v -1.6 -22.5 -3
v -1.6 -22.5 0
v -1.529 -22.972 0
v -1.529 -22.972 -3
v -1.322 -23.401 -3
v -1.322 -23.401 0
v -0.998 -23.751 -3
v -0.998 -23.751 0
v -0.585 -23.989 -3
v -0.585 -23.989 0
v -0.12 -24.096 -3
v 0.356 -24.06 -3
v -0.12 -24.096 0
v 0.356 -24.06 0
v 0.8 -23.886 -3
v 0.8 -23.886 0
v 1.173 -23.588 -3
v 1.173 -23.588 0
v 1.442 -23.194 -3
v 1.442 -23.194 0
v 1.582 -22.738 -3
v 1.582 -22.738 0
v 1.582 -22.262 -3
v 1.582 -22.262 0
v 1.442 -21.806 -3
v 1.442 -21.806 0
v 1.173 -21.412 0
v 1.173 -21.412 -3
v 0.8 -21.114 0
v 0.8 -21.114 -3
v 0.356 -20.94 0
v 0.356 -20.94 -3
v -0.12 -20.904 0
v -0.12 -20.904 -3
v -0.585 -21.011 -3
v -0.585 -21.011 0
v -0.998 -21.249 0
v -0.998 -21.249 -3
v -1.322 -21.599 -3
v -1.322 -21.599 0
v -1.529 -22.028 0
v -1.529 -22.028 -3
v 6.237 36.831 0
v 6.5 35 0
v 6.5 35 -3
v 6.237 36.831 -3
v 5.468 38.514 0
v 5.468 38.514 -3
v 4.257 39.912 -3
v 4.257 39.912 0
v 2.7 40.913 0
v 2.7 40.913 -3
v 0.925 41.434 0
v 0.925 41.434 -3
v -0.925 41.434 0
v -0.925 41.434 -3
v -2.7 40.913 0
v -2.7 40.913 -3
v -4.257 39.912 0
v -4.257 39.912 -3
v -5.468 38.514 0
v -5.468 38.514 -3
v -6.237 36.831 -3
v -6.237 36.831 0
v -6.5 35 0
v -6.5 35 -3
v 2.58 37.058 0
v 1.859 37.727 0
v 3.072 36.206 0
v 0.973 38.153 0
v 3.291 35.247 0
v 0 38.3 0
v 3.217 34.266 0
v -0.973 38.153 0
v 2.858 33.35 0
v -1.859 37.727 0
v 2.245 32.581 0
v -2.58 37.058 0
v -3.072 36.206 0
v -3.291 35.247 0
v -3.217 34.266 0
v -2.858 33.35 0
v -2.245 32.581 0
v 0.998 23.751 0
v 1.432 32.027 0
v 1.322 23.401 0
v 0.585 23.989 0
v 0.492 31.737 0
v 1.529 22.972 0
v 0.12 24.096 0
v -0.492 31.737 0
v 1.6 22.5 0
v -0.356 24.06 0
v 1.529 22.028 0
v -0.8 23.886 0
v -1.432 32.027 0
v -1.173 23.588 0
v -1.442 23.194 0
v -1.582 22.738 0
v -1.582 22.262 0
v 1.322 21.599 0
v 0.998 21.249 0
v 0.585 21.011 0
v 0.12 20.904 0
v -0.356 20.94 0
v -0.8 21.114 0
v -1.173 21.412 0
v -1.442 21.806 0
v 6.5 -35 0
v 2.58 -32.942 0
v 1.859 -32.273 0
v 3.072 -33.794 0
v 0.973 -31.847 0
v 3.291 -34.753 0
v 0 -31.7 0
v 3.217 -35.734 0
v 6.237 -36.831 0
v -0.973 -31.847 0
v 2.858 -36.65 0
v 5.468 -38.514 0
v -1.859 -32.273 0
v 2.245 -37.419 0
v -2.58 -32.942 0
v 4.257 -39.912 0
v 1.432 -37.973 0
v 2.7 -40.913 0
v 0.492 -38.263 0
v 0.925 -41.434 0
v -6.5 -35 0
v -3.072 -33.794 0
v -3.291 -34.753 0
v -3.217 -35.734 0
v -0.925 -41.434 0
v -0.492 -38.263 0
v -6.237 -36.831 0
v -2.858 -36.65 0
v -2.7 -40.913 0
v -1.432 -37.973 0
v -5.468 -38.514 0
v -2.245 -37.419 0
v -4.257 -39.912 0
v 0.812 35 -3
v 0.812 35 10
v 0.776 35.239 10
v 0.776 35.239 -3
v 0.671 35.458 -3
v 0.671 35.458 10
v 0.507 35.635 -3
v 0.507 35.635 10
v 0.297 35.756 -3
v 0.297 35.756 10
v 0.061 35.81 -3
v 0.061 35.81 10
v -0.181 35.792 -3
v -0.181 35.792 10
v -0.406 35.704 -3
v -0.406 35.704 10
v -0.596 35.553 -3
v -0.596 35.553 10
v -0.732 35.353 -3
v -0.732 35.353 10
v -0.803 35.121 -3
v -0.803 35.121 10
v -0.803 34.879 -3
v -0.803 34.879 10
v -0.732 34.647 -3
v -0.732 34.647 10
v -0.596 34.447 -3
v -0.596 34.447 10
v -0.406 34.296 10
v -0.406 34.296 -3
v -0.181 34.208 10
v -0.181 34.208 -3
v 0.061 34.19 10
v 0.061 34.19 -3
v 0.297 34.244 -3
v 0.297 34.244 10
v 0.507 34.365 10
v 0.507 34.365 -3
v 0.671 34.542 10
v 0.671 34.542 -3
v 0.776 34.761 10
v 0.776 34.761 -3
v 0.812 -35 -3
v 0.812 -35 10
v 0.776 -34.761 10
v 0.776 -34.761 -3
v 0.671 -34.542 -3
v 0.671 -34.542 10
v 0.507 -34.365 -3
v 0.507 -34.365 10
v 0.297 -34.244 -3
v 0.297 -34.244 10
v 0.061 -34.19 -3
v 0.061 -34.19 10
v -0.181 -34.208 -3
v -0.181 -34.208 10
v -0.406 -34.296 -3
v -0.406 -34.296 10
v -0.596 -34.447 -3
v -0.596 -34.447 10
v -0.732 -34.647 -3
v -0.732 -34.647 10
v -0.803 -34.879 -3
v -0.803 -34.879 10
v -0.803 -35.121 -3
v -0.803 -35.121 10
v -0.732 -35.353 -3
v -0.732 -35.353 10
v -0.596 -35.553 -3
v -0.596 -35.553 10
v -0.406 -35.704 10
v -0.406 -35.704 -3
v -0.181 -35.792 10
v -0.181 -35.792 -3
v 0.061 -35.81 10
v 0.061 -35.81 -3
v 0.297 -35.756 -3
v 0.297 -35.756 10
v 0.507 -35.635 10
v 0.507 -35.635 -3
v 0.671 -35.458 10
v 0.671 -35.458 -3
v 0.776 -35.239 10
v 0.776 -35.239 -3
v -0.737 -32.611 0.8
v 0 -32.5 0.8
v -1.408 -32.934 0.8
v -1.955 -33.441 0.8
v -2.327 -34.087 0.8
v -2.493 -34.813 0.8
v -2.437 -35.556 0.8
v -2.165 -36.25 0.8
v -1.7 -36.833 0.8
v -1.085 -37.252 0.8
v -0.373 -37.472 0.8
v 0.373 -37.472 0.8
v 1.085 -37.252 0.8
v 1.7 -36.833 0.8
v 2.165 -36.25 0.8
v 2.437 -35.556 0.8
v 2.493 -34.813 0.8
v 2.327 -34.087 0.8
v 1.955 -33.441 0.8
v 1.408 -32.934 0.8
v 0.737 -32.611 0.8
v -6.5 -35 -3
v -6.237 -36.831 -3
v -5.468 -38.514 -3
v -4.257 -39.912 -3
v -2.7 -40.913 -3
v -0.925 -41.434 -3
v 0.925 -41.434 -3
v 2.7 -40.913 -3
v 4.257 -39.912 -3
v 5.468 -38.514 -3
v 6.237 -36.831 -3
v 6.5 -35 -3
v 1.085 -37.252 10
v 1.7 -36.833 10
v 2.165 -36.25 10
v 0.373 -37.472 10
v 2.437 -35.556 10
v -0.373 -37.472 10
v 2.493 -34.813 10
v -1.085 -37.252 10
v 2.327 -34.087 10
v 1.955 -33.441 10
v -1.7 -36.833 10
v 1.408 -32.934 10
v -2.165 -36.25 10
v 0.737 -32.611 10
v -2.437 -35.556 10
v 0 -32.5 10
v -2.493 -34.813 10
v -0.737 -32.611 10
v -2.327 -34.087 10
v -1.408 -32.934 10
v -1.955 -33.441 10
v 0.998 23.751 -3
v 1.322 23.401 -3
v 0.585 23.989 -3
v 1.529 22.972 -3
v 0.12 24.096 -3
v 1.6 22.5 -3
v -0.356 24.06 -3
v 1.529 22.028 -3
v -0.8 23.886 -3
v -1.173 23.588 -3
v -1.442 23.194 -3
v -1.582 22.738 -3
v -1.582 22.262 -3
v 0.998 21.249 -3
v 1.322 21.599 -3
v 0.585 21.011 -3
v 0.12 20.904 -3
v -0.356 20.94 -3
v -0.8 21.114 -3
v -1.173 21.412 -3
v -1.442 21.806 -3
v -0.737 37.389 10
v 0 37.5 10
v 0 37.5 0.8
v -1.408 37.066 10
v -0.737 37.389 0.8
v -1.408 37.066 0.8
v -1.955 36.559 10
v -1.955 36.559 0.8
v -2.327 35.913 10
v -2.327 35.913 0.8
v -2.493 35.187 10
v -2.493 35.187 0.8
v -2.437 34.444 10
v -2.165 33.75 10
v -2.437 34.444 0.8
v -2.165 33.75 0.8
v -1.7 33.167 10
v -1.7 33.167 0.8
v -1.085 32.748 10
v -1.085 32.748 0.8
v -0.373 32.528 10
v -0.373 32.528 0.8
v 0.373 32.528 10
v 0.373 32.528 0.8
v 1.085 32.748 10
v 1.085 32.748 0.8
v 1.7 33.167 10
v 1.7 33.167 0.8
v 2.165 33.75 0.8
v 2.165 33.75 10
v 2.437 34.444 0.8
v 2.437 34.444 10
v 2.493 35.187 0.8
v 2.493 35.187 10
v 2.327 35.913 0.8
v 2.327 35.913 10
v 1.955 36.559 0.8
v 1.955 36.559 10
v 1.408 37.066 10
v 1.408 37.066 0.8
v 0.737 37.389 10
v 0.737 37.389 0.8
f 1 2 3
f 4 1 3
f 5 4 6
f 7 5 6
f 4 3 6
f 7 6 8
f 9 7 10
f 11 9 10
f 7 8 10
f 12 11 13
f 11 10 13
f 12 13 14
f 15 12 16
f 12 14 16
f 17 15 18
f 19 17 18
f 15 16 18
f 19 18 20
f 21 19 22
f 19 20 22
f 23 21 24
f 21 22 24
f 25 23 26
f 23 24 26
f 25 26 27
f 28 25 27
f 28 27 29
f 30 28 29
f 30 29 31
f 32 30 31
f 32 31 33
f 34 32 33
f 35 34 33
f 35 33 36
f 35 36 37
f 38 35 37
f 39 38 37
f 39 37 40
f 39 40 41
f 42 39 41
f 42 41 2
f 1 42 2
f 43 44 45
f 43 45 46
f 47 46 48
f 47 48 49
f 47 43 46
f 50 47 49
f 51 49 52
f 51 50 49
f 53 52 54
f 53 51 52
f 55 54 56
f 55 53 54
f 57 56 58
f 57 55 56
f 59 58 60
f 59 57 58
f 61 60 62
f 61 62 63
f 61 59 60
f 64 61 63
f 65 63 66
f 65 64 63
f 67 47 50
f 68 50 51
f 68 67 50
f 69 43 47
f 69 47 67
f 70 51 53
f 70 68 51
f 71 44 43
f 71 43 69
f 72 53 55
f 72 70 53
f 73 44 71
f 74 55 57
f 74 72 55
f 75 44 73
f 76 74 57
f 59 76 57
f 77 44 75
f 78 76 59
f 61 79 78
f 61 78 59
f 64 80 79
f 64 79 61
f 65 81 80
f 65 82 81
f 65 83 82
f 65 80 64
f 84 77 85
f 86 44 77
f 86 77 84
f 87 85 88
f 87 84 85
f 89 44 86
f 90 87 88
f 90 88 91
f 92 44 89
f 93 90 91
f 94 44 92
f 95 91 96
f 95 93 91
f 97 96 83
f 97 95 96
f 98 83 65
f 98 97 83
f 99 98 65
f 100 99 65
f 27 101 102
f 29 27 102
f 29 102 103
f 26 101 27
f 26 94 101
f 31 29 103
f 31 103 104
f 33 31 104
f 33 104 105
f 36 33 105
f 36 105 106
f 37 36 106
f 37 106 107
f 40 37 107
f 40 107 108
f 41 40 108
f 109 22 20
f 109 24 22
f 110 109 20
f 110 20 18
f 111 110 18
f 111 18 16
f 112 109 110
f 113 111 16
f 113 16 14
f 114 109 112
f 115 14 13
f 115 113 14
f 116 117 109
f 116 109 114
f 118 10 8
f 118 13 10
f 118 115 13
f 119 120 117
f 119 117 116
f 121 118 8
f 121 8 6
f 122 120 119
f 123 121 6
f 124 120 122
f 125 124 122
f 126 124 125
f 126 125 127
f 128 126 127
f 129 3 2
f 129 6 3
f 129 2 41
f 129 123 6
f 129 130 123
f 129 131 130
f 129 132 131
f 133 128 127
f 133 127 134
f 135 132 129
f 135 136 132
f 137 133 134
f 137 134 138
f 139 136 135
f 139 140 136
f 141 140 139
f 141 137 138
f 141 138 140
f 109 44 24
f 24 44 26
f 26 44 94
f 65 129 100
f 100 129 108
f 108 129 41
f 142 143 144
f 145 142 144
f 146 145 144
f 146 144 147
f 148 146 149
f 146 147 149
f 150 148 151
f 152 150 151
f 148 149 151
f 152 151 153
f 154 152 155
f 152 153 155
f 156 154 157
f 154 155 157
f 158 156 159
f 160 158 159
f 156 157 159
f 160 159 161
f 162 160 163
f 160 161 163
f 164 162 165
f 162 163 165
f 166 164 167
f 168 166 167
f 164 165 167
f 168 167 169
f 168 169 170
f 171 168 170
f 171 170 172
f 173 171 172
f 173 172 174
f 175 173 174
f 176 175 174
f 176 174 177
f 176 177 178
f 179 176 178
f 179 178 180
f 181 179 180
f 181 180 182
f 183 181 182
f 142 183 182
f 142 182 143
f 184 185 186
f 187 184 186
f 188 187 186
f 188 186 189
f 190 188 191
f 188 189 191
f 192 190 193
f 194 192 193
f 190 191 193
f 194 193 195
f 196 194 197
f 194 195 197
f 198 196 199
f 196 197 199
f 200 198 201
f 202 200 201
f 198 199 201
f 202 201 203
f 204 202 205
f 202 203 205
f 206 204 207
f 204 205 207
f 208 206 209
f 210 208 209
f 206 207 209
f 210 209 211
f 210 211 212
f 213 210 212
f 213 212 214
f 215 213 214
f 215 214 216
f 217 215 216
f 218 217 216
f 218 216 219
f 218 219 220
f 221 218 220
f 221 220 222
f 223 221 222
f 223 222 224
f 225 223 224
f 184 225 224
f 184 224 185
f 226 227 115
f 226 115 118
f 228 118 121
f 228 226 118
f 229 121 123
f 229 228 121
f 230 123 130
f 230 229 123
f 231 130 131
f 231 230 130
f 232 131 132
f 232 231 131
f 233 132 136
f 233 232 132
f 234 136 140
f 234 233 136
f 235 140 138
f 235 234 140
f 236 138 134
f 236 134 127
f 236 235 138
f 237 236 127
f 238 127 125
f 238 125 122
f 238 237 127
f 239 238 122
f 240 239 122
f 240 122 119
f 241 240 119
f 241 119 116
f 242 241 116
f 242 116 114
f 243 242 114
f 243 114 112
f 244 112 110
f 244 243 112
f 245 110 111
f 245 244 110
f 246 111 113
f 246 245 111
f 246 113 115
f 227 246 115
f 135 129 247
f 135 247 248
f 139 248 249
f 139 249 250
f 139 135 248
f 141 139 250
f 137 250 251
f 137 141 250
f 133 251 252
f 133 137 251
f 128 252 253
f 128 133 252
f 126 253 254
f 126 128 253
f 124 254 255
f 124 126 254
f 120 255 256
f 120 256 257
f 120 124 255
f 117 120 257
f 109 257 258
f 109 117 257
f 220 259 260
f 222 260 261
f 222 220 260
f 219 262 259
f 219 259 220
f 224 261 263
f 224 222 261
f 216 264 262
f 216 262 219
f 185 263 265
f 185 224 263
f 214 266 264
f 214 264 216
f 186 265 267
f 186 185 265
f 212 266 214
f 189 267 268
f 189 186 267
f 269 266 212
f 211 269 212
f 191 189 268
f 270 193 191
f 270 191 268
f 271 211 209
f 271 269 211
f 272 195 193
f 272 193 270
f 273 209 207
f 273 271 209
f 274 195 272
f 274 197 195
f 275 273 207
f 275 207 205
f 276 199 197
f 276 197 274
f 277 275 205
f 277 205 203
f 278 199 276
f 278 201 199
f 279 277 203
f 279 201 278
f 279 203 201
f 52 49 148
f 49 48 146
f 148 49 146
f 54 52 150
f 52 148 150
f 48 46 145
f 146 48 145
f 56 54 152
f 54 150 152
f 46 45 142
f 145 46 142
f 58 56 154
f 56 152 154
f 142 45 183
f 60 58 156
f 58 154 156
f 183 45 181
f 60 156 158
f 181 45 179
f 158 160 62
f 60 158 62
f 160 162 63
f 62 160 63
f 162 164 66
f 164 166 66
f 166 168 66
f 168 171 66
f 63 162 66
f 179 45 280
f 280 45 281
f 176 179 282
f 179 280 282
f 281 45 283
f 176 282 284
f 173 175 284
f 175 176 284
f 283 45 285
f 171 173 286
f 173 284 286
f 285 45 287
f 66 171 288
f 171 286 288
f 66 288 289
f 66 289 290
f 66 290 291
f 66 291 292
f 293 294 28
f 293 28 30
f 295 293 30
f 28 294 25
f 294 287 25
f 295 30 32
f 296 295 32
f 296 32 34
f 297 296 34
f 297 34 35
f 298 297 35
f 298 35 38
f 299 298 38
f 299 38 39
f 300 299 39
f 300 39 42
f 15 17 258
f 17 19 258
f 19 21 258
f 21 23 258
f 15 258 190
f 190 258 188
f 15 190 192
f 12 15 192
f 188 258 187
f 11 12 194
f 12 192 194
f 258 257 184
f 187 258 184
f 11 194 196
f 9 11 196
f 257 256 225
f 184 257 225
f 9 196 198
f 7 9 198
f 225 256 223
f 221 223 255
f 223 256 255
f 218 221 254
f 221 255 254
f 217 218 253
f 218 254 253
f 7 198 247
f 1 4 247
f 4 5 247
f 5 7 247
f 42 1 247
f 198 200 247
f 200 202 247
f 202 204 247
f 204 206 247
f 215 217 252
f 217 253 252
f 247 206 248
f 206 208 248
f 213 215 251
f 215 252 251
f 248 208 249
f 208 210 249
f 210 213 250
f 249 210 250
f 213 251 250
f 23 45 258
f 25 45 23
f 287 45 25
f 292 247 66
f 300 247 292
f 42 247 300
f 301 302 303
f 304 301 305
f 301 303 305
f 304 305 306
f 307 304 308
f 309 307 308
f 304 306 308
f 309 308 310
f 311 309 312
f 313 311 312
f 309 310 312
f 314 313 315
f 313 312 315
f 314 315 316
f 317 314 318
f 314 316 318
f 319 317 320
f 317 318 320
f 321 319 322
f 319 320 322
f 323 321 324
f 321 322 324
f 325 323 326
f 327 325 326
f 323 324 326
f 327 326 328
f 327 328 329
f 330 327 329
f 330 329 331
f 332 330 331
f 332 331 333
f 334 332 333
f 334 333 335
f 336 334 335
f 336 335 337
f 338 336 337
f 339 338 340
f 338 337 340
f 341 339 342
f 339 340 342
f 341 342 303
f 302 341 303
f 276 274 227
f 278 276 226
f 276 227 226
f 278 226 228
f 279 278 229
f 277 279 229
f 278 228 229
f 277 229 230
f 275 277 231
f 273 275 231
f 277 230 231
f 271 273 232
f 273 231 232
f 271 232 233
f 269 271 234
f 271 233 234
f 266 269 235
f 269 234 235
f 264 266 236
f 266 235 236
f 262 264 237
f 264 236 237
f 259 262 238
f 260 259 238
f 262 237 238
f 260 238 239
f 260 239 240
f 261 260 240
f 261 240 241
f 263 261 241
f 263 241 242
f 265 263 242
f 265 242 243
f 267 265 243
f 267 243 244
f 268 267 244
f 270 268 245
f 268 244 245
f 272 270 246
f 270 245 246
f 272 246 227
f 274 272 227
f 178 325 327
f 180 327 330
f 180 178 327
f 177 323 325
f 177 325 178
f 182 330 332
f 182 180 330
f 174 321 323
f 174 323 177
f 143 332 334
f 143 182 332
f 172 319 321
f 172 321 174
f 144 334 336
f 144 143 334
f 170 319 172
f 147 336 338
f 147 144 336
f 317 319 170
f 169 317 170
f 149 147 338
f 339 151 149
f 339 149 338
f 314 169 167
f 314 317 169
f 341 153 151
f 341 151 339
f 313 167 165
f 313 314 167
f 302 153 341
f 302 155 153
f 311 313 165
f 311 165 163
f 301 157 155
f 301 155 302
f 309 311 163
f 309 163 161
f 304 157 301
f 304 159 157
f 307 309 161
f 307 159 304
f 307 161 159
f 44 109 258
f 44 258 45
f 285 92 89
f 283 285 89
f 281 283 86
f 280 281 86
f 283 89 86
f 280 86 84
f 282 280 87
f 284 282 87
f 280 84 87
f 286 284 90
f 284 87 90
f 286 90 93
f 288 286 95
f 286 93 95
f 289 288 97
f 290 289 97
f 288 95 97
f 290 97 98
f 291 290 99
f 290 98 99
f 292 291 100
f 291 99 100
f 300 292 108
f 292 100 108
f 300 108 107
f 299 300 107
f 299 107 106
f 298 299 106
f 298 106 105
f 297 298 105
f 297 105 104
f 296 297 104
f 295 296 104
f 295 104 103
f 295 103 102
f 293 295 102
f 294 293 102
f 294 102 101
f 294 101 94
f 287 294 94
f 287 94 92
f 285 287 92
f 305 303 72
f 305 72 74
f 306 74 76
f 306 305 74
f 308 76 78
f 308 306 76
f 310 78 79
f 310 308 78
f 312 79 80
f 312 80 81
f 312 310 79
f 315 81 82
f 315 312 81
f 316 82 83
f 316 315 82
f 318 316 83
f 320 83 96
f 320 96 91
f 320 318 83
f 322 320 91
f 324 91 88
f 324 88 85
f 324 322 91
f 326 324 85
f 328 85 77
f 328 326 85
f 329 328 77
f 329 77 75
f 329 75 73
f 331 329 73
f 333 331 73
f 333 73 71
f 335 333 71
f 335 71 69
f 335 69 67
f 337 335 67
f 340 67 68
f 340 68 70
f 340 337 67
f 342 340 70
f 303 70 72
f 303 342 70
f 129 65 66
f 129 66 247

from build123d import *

# Parameters (mm, degrees)
SKETCH1_R             = 2.5
BOSS_EXTRUDE1_DEPTH   = 10
BOSS_EXTRUDE1_2_DEPTH = 10
BOSS_EXTRUDE2_DEPTH   = 3
SKETCH3_R             = 0.8125
CUT_EXTRUDE1_DEPTH    = 18
CHAMFER1_SIZE         = 0.8
SKETCH4_R             = 1.6
CUT_EXTRUDE2_DEPTH    = 10


with BuildPart() as part:
    # Sketch1 → Boss-Extrude1 (new body)
    with BuildSketch(Plane(origin=(0, 0, 0), x_dir=(0, 1, 0), z_dir=(0, 0, 1))):
        with Locations((-35, 0)):
            Circle(SKETCH1_R)
    extrude(amount=BOSS_EXTRUDE1_DEPTH)



with BuildPart() as body_2:
    # Sketch1 → Boss-Extrude1 2 (new body)
    with BuildSketch(Plane(origin=(0, 0, 0), x_dir=(0, 1, 0), z_dir=(0, 0, 1))):
        with Locations((35, 0)):
            Circle(SKETCH1_R)
    extrude(amount=BOSS_EXTRUDE1_2_DEPTH)


with BuildPart() as part_1:
    add(part.part)

    add(body_2.part)  # Boss-Extrude2 merges body 2
    # Sketch2 → Boss-Extrude2 (add)
    with BuildSketch(Plane(origin=(0, 0, 0), x_dir=(1, 0, 0), z_dir=(0, 0, -1))):
        with BuildLine():
            Line((6.5, 35), (6.5, -35))
            ThreePointArc((6.5, -35), (0, -41.5), (-6.5, -35))
            Line((-6.5, -35), (-6.5, 35))
            ThreePointArc((-6.5, 35), (0, 41.5), (6.5, 35))
        make_face()
    extrude(amount=BOSS_EXTRUDE2_DEPTH)

    # Sketch3 → Cut-Extrude1 (cut)
    with BuildSketch(Plane.XY.offset(10)):
        with Locations((0, -35)):
            Circle(SKETCH3_R)
        with Locations((0, 35)):
            Circle(SKETCH3_R)
    extrude(amount=-CUT_EXTRUDE1_DEPTH, mode=Mode.SUBTRACT)

    # Chamfer1
    chamfer1_edges = [part_1.edges().sort_by_distance(p)[0] for p in [
        (0, 32.5, 0),
        (0, -37.5, 0),
    ]]
    chamfer(chamfer1_edges, length=CHAMFER1_SIZE)

    # Sketch4 → Cut-Extrude2 (cut)
    with BuildSketch(Plane.XY):
        with Locations((0, 22.5)):
            Circle(SKETCH4_R)
        with Locations(Location((0, -22.5, 0), (0, 0, 180))):
            Circle(SKETCH4_R)
    extrude(amount=-CUT_EXTRUDE2_DEPTH, mode=Mode.SUBTRACT)


solid = part_1.part
